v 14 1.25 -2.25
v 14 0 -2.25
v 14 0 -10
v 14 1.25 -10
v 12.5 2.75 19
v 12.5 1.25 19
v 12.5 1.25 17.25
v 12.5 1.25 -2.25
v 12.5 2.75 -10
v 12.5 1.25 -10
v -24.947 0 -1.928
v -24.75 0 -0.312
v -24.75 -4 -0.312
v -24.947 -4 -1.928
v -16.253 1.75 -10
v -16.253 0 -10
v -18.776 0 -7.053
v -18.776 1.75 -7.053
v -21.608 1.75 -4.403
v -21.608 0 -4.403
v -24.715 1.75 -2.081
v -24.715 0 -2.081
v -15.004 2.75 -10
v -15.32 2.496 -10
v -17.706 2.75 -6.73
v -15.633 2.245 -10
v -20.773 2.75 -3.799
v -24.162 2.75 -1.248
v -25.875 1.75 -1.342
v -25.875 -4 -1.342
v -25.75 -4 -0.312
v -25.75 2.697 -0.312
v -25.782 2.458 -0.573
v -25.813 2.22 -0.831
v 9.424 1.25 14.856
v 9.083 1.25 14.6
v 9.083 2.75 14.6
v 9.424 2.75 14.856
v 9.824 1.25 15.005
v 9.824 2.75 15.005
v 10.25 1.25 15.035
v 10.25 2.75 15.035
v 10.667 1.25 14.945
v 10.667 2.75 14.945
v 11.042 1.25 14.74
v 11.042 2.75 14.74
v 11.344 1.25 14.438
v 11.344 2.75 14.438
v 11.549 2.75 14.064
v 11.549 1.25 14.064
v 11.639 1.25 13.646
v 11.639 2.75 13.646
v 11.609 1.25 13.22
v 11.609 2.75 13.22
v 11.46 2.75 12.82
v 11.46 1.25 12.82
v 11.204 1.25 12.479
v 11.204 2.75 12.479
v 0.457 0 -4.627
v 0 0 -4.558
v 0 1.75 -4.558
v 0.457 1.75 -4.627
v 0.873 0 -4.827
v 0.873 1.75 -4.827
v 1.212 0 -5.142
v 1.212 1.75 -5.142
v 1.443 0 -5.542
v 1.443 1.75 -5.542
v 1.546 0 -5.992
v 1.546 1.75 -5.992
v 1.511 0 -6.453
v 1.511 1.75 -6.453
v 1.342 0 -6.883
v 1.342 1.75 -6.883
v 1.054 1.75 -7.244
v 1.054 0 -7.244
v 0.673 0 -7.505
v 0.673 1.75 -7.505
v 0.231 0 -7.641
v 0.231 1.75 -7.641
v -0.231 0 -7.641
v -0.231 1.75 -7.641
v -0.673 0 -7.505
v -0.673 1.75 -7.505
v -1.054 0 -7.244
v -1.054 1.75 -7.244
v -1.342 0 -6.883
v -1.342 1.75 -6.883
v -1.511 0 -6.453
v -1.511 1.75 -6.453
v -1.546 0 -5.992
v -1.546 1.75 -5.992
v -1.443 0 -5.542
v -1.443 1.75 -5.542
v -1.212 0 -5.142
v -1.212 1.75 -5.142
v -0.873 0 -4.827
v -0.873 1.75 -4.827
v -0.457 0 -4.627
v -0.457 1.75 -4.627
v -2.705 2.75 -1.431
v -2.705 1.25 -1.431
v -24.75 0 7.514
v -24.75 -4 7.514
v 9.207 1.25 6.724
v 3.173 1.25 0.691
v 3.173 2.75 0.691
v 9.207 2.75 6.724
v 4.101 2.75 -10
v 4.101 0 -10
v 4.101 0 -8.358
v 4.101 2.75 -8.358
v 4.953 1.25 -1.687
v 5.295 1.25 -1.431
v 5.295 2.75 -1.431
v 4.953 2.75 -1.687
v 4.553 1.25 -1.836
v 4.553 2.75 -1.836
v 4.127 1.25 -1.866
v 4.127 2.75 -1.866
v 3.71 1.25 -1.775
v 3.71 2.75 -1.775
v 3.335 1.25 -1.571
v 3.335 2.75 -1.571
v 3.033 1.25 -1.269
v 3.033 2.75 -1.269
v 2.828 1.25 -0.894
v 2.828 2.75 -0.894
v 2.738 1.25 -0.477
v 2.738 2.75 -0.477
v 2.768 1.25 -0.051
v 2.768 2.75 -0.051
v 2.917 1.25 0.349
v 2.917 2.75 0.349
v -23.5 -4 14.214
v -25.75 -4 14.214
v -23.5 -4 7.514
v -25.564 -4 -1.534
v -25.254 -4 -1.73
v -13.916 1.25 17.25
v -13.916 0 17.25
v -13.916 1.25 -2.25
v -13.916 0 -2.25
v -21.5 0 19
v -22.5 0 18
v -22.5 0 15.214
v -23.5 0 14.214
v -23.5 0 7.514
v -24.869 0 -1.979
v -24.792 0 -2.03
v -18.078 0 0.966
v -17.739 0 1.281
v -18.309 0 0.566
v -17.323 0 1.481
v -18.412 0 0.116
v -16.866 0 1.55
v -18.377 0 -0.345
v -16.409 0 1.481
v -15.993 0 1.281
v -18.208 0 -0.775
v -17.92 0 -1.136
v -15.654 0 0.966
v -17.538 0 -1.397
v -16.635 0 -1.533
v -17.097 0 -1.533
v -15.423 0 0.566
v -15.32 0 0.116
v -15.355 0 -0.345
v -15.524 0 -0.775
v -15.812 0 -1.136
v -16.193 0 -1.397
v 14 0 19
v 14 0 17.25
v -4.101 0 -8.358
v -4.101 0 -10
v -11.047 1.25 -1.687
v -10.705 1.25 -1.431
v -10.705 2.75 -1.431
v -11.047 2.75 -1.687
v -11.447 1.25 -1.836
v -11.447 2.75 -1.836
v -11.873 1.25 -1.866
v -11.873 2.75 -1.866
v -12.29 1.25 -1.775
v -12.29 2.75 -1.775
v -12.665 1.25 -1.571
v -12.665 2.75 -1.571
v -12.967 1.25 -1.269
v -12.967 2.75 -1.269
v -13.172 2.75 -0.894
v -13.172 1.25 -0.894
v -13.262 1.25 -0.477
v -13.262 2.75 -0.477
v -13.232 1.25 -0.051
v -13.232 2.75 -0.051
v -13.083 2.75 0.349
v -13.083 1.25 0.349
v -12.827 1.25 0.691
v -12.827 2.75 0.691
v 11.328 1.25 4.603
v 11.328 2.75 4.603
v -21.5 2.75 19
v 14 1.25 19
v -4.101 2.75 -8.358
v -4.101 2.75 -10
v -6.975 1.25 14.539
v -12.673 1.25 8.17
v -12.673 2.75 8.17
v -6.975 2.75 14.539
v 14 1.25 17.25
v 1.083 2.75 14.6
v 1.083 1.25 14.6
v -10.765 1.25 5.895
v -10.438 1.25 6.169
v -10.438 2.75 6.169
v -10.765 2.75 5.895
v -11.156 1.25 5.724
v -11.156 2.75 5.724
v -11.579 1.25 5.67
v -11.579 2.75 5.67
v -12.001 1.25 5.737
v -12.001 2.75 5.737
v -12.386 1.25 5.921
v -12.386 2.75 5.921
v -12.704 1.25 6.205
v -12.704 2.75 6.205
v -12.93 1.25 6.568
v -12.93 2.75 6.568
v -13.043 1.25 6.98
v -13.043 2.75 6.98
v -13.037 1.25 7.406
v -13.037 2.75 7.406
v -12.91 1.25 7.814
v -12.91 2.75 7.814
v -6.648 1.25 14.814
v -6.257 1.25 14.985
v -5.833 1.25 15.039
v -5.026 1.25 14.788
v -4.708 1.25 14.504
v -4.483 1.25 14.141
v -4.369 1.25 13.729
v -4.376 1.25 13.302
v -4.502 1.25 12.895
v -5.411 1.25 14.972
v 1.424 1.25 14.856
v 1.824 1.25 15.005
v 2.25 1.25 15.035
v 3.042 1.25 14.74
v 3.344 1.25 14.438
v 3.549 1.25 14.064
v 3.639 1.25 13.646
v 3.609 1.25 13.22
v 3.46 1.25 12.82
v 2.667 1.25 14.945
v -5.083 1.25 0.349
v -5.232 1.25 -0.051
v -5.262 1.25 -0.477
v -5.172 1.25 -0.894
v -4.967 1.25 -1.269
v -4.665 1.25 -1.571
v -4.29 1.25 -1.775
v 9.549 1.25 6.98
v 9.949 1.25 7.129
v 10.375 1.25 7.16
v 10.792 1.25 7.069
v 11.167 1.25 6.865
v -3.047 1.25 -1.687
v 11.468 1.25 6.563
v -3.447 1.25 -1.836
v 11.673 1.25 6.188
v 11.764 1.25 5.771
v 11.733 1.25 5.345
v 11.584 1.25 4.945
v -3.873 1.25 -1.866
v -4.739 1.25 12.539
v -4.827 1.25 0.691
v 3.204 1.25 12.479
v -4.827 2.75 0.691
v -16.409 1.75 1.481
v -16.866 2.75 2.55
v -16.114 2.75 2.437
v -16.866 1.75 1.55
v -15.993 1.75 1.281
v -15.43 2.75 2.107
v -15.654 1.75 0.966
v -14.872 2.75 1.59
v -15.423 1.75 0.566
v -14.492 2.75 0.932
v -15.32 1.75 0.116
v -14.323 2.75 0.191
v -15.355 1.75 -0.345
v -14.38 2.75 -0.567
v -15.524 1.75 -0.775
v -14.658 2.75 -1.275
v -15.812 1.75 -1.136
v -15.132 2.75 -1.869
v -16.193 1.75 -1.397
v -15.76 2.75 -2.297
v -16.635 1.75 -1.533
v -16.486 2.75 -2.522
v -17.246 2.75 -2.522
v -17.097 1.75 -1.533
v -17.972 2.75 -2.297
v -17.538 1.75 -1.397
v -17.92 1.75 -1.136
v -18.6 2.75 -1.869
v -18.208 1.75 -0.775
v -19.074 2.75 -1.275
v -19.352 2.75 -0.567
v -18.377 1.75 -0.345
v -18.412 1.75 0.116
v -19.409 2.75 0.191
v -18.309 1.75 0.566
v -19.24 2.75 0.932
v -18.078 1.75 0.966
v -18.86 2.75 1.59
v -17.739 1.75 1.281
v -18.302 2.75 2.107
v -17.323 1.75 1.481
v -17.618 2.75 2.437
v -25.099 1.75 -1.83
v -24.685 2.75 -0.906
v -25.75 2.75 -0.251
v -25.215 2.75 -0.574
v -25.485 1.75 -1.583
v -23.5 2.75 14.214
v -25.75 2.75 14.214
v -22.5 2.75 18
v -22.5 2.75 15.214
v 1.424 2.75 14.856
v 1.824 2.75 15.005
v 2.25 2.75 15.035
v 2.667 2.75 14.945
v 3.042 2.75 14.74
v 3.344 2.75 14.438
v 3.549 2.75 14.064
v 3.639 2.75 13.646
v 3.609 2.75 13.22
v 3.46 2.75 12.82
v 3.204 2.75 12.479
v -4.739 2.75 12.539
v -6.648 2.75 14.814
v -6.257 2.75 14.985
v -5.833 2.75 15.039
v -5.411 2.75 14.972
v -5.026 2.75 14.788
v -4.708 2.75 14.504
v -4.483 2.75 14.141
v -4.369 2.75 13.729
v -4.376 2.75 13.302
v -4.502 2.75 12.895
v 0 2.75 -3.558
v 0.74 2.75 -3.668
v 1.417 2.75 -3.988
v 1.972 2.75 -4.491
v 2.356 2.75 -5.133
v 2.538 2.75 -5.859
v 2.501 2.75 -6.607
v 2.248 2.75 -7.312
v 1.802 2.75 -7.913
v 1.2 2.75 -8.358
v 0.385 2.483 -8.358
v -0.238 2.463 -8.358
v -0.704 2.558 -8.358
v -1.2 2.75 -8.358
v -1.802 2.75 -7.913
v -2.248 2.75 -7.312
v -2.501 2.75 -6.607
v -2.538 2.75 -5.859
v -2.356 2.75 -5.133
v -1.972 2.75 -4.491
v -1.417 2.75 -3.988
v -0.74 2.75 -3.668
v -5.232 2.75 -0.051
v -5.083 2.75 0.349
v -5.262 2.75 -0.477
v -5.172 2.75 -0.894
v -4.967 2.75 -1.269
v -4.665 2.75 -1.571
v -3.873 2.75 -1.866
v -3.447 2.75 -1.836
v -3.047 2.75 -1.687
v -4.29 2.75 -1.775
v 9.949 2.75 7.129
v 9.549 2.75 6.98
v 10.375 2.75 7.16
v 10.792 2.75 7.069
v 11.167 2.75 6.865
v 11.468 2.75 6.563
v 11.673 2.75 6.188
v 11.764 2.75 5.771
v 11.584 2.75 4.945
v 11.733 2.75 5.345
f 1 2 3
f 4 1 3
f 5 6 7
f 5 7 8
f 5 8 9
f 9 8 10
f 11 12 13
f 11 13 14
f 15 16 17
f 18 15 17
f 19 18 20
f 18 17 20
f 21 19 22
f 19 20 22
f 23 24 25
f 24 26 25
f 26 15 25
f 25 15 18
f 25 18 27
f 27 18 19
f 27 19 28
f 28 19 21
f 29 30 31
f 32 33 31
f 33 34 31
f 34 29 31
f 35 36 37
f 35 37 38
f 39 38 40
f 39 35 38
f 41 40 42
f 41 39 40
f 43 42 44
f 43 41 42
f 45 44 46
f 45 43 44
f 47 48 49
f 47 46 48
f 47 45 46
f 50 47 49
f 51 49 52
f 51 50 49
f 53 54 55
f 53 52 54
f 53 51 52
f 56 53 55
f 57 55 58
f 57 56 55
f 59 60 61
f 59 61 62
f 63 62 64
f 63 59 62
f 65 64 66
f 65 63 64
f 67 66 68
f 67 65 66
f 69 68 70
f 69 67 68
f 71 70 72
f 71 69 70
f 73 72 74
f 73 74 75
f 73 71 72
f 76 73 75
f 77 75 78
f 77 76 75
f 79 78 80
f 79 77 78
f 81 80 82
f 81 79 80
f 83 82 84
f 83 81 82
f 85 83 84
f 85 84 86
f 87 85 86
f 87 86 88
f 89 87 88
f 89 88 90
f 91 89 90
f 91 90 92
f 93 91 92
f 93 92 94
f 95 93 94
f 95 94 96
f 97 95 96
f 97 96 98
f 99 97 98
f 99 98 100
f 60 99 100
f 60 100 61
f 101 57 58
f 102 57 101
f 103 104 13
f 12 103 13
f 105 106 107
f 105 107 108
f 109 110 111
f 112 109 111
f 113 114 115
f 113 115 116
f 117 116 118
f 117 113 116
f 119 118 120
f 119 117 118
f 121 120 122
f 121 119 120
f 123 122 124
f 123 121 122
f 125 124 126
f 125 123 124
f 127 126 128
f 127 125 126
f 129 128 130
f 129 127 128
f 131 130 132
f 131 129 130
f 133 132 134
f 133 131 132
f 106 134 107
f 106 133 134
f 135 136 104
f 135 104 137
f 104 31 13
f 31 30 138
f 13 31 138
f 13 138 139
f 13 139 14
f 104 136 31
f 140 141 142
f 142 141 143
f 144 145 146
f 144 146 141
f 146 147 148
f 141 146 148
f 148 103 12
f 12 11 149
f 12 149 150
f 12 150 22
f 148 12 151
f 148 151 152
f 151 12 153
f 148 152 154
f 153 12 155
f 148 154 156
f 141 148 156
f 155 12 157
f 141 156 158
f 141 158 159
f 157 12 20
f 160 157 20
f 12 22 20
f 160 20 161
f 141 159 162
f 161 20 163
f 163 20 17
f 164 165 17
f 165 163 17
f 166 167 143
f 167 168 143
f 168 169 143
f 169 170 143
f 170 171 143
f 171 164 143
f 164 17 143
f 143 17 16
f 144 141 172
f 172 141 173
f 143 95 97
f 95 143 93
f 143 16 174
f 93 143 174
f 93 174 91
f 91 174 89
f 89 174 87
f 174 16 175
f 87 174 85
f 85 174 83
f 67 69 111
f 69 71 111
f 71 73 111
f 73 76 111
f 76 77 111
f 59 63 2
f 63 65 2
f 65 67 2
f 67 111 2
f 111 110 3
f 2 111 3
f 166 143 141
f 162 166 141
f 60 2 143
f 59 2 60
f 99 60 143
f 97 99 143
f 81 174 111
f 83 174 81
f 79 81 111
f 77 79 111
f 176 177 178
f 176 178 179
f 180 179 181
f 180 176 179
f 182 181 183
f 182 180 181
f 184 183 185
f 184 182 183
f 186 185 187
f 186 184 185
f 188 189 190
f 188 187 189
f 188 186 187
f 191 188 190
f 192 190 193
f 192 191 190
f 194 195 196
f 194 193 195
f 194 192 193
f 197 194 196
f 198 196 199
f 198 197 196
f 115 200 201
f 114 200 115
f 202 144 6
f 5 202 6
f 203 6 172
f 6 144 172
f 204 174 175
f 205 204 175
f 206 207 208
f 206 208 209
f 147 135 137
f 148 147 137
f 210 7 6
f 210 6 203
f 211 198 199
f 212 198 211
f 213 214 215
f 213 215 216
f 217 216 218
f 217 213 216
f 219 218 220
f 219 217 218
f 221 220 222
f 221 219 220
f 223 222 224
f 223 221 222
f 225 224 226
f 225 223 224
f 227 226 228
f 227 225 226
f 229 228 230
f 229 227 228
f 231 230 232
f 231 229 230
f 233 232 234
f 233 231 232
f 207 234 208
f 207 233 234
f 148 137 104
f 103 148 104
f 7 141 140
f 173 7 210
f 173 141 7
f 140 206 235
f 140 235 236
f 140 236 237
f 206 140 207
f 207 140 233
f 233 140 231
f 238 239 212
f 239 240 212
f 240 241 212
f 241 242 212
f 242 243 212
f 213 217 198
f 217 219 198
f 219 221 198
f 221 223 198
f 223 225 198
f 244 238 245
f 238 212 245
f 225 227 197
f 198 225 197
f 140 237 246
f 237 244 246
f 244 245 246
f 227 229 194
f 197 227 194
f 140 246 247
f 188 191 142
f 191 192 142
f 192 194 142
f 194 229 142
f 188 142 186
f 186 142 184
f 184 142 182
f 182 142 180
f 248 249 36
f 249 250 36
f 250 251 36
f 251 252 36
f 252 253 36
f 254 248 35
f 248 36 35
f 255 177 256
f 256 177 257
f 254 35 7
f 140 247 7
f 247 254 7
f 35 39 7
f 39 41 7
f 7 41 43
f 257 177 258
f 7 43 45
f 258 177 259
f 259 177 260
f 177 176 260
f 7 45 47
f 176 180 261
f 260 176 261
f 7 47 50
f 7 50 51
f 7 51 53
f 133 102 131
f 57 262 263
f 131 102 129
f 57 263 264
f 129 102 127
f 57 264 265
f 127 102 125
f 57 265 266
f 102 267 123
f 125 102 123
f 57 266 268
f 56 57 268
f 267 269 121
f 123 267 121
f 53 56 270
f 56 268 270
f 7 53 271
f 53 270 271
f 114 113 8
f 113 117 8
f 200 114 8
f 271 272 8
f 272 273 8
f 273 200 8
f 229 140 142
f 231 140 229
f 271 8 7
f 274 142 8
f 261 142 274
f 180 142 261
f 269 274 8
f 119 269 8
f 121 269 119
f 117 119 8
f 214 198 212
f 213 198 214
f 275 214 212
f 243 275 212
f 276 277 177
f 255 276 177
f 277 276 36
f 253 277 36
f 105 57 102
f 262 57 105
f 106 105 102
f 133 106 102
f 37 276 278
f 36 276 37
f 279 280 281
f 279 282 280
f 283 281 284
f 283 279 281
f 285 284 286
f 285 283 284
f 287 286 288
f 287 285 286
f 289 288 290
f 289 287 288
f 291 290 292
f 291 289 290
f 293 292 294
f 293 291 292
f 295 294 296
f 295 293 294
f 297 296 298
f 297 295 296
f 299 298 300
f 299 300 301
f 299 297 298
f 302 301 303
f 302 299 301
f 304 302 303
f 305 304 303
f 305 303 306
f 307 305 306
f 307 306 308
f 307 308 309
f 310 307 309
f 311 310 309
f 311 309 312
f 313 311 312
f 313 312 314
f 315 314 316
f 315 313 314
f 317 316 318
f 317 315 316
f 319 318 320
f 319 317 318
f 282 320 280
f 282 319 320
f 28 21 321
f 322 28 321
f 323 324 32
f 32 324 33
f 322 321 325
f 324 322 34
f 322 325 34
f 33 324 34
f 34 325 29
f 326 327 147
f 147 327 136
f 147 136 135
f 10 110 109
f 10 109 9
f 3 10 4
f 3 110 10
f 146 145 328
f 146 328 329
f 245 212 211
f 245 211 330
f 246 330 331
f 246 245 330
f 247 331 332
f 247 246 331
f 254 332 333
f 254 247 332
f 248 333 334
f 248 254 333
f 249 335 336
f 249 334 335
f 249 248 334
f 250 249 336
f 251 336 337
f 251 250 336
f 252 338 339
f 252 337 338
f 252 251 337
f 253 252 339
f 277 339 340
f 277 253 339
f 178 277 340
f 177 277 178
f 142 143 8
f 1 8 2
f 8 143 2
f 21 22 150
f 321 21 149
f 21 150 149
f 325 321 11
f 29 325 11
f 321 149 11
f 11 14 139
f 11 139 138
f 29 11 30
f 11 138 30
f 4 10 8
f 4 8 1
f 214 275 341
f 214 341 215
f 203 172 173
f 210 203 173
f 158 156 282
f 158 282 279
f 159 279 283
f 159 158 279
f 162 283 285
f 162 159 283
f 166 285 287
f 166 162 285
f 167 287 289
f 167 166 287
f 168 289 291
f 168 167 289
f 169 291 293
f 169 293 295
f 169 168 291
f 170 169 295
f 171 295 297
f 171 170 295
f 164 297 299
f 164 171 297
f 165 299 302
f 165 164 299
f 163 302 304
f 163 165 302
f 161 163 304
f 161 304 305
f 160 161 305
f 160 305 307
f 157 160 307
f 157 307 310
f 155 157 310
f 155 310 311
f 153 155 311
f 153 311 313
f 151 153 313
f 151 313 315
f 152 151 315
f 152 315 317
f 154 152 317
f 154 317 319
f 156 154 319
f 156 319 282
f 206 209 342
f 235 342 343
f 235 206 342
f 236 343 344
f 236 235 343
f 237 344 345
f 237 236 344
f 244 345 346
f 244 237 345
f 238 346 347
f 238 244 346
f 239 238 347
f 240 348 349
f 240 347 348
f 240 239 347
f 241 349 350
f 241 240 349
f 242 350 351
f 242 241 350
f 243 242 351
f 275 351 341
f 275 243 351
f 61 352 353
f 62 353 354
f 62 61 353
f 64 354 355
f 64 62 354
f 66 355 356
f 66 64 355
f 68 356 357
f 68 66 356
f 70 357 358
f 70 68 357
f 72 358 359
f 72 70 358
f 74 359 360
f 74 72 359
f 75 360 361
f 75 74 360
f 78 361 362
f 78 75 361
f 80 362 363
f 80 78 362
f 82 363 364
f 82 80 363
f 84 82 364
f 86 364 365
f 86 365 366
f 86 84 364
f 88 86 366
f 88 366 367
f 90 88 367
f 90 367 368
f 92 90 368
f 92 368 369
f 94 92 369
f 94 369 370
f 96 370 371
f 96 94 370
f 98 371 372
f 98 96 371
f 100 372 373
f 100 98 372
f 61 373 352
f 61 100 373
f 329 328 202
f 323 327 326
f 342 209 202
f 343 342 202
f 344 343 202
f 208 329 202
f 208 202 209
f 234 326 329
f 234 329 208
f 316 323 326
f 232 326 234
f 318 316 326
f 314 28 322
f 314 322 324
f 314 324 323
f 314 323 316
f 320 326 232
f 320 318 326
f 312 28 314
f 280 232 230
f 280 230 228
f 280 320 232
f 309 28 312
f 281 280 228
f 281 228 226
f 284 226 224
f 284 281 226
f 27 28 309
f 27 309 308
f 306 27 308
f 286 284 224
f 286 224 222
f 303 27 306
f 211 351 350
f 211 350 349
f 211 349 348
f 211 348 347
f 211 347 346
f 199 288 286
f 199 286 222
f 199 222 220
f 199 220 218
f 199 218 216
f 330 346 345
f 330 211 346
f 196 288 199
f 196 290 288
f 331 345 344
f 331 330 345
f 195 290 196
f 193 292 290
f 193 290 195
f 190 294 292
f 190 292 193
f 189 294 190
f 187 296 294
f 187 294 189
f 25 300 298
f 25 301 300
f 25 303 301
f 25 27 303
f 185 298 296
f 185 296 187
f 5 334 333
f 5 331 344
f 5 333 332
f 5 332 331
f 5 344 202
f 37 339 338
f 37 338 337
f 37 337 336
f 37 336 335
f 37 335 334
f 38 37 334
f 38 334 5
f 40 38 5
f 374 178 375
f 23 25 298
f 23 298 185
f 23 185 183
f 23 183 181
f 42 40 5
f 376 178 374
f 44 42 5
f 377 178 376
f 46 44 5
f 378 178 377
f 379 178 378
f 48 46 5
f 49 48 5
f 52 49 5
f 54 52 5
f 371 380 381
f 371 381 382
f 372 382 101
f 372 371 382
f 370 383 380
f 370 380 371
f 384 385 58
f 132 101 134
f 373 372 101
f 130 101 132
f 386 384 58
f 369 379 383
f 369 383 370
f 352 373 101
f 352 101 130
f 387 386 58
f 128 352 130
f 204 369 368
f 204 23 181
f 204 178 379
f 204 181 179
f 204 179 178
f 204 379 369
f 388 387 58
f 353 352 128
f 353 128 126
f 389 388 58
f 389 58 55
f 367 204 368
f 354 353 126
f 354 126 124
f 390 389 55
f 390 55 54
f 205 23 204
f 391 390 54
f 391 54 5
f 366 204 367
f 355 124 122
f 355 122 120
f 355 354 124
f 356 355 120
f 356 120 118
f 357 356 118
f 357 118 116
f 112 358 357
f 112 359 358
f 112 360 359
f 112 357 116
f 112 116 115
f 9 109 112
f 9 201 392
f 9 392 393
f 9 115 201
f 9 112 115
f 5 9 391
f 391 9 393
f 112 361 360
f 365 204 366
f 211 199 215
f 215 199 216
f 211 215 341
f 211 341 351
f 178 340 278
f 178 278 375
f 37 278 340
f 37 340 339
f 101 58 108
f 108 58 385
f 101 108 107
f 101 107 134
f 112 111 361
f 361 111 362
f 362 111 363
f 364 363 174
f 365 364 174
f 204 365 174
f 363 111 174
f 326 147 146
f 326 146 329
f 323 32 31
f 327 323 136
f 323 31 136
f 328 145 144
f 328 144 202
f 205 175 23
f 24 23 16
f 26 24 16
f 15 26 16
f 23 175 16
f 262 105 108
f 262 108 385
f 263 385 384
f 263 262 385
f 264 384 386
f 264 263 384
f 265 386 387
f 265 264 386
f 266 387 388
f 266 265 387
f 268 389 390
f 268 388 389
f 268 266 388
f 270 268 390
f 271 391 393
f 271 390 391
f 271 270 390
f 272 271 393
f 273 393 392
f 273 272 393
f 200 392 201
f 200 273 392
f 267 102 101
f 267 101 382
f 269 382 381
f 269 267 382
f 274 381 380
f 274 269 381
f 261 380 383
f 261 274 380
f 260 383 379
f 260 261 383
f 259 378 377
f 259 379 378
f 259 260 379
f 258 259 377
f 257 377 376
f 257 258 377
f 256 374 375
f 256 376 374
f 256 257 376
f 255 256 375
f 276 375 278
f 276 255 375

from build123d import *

# Parameters (mm, degrees)
SKETCH_221_R           = 1.55
EXTRUDE_926_DEPTH      = 2.75
SKETCH_1005_W          = 35.000000002
SKETCH_1005_H          = 4.75
EXTRUDE_1111_DEPTH     = 2.75
EXTRUDE_1_DEPTH        = 2.75
F_2_PCB_START          = -4
F_2_PCB_DEPTH          = 4
SKETCH_2154_W          = 1.5
SKETCH_2154_H          = 28.99988509
EXTRUDE_2226_DEPTH     = 1.25
SKETCH_2278_W          = 27.915979255
SKETCH_2278_H          = 19.5
PCB_DEPTH              = 1.25
CUT_EXTRUDE_2_DEPTH    = 33.528299963
CHAMFER_1_SIZE         = 1
CHAMFER_2_SIZE         = 1
CUT_EXTRUDE_3384_DEPTH = 4


with BuildPart() as part:
    # Sketch 221 → Extrude 926 (new body)
    with BuildSketch(Plane(origin=(0, 0, 0), x_dir=(1, 0, 0), z_dir=(0, 1, 0))):
        with BuildLine():
            ThreePointArc((-16.252981126, 10), (-20.15501929, 5.688743466), (-24.715186194, 2.08073674))
            Line((-24.715186194, 2.08073674), (-24.500000002, 0.312480077))
            Line((-24.500000002, 0.312480077), (-24.500000002, -7.263629174))
            Line((-24.500000002, -7.263629174), (-22.500000002, -7.263629174))
            Line((-22.500000002, -7.263629174), (-22.500000002, -14.24988509))
            Line((-22.500000002, -14.24988509), (12.5, -14.24988509))
            Line((12.5, -14.24988509), (12.5, 10))
            Line((12.5, 10), (4.100927374, 10))
            Line((4.100927374, 10), (4.100927374, 8.35804307))
            Line((4.100927374, 8.35804307), (-4.100927378, 8.35804307))
            Line((-4.100927378, 8.35804307), (-4.100927378, 10))
            Line((-4.100927378, 10), (-16.252981126, 10))
        make_face()
        with Locations(Location((-16.865979255, 0, 0), (0, 0, 270))):
            Circle(SKETCH_221_R, mode=Mode.SUBTRACT)
        with Locations(Location((-2e-09, 6.108043073, 0), (0, 0, 270))):
            Circle(SKETCH_221_R, mode=Mode.SUBTRACT)
    extrude(amount=EXTRUDE_926_DEPTH)

    # Sketch 1005 → Extrude 1111 (add)
    with BuildSketch(Plane(origin=(0, 0, 0), x_dir=(1, 0, 0), z_dir=(0, 1, 0))):
        with Locations((-5.000000001, -16.62488509)):
            Rectangle(SKETCH_1005_W, SKETCH_1005_H)
    extrude(amount=EXTRUDE_1111_DEPTH)

    # Sketch 1191 → 卡榫结构-1 (add)
    with BuildSketch(Plane(origin=(0, 0, 0), x_dir=(1, 0, 0), z_dir=(0, 1, 0))):
        with BuildLine():
            Line((-25.750000002, -14.213629174), (-22.500000002, -14.213629174))
            Line((-22.500000002, -14.213629174), (-22.500000002, -7.263629174))
            Line((-22.500000002, -7.263629174), (-24.500000002, -7.263629174))
            Line((-24.500000002, -7.263629174), (-24.500000002, 0.312480077))
            Line((-24.500000002, 0.312480077), (-24.715186194, 2.08073674))
            ThreePointArc((-24.715186194, 2.08073674), (-25.291636518, 1.705823535), (-25.875319612, 1.342273079))
            Line((-25.875319612, 1.342273079), (-25.750000002, 0.312480077))
            Line((-25.750000002, 0.312480077), (-25.750000002, -14.213629174))
        make_face()
    extrude(amount=EXTRUDE_1_DEPTH)

    # 草图5<4> → 卡榫结构-2-注意PCB凸出部分 (add)
    with BuildSketch(Plane(origin=(0, 0, 0), x_dir=(1, 0, 0), z_dir=(0, 1, 0)).offset(F_2_PCB_START)):
        with BuildLine():
            Line((-25.750000002, -14.213629174), (-23.500000002, -14.213629174))
            Line((-23.500000002, -14.213629174), (-23.500000002, -7.263629174))
            Line((-23.500000002, -7.263629174), (-24.500000002, -7.263629174))
            Line((-24.500000002, -7.263629174), (-24.500000002, 0.312480077))
            Line((-24.500000002, 0.312480077), (-24.715186194, 2.08073674))
            ThreePointArc((-24.715186194, 2.08073674), (-25.291636518, 1.705823535), (-25.875319612, 1.342273079))
            Line((-25.875319612, 1.342273079), (-25.750000002, 0.312480077))
            Line((-25.750000002, 0.312480077), (-25.750000002, -14.213629174))
        make_face()
    extrude(amount=F_2_PCB_DEPTH)

    # Sketch 2154 → Extrude 2226 (add)
    with BuildSketch(Plane(origin=(0, 0, 0), x_dir=(1, 0, 0), z_dir=(0, 1, 0))):
        with Locations((13.25, -4.499942545)):
            Rectangle(SKETCH_2154_W, SKETCH_2154_H)
    extrude(amount=EXTRUDE_2226_DEPTH)

    # Sketch 2278 → 稳压PCB器件高度补偿 (cut)
    with BuildSketch(Plane(origin=(0, 0, 0), x_dir=(1, 0, 0), z_dir=(0, 1, 0))):
        with Locations((0.042010372, -7.5)):
            Rectangle(SKETCH_2278_W, SKETCH_2278_H)
    extrude(amount=PCB_DEPTH, mode=Mode.SUBTRACT)

    # Sketch 2514 → 切除-拉伸2 (cut, through all)
    with BuildSketch(Plane.XZ.offset(-1.25)):
        with BuildLine():
            Line((3.173198201, 0.69066828), (9.20694903, 6.724419109))
            ThreePointArc((9.20694903, 6.724419109), (11.328269373, 6.724419109), (11.328269373, 4.603098766))
            Line((11.328269373, 4.603098766), (5.294518544, -1.430652063))
            ThreePointArc((5.294518544, -1.430652063), (3.173198201, -1.430652063), (3.173198201, 0.69066828))
        make_face()
        with BuildLine():
            Line((-4.826801799, 0.69066828), (9.08250112, 14.5999712))
            ThreePointArc((9.08250112, 14.5999712), (11.203821464, 14.5999712), (11.203821464, 12.478650856))
            Line((11.203821464, 12.478650856), (-2.705481456, -1.430652063))
            ThreePointArc((-2.705481456, -1.430652063), (-4.826801799, -1.430652063), (-4.826801799, 0.69066828))
        make_face()
        with BuildLine():
            Line((-12.826801799, 0.69066828), (1.08250112, 14.5999712))
            ThreePointArc((1.08250112, 14.5999712), (3.203821464, 14.5999712), (3.203821464, 12.478650856))
            Line((3.203821464, 12.478650856), (-10.705481456, -1.430652063))
            ThreePointArc((-10.705481456, -1.430652063), (-12.826801799, -1.430652063), (-12.826801799, 0.69066828))
        make_face()
        with BuildLine():
            Line((-4.738916917, 12.539185601), (-10.437516852, 6.169395501))
            ThreePointArc((-10.437516852, 6.169395501), (-12.555564069, 6.051599138), (-12.673360433, 8.169646355))
            Line((-12.673360433, 8.169646355), (-6.974760498, 14.539436455))
            ThreePointArc((-6.974760498, 14.539436455), (-4.856713281, 14.657232819), (-4.738916917, 12.539185601))
        make_face()
    extrude(amount=-CUT_EXTRUDE_2_DEPTH, mode=Mode.SUBTRACT)

    # 倒角1
    chamfer_1_edges = [part.edges().sort_by_distance(p)[0] for p in [
        (-20.661675073, 2.75, -5.223818951),
        (-22.500000002, 1.375, 18.99988509),
        (-22.500000002, 1.375, 14.213629174),
    ]]
    chamfer(chamfer_1_edges, length=CHAMFER_1_SIZE)

    # 倒角2
    # the kernel refuses this chamfer: 1 mm, written as the material it takes off along each edge
    with BuildSketch(Plane(origin=(-2e-09, 2.75, -6.108043073), x_dir=(0, 0, 1), z_dir=(-1, 0, 0))) as chamfer_2_piece_1:
        Polygon((1.55 + CHAMFER_2_SIZE, 0), (1.55, -CHAMFER_2_SIZE), (1.55, 0), align=None)
    revolve(axis=Axis((-2e-09, 2.75, -6.108043073), (0, 1, 0)), mode=Mode.SUBTRACT)
    with BuildSketch(Plane(origin=(-16.865979255, 2.75, 0), x_dir=(0, 0, 1), z_dir=(-1, 0, 0))) as chamfer_2_piece_2:
        Polygon((1.55 + CHAMFER_2_SIZE, 0), (1.55, -CHAMFER_2_SIZE), (1.55, 0), align=None)
    revolve(axis=Axis((-16.865979255, 2.75, 0), (0, 1, 0)), mode=Mode.SUBTRACT)

    # 草图1 → Cut-Extrude 3384 (cut)
    with BuildSketch(Plane.XZ.offset(4)):
        with BuildLine():
            Line((-24.715186194, -2.08073674), (-24.500000002, -0.312480077))
            Line((-24.500000002, -0.312480077), (-24.500000002, 7.263629174))
            Line((-24.500000002, 7.263629174), (-23.500000002, 7.263629174))
            Line((-23.500000002, 7.263629174), (-23.500000002, 7.513629174))
            Line((-23.500000002, 7.513629174), (-24.750000002, 7.513629174))
            Line((-24.750000002, 7.513629174), (-24.750000002, -0.312480077))
            Line((-24.750000002, -0.312480077), (-24.946632534, -1.928275128))
            ThreePointArc((-24.946632534, -1.928275128), (-24.830758909, -2.004277534), (-24.715186194, -2.08073674))
        make_face()
    extrude(amount=-CUT_EXTRUDE_3384_DEPTH, mode=Mode.SUBTRACT)


solid = part.part
